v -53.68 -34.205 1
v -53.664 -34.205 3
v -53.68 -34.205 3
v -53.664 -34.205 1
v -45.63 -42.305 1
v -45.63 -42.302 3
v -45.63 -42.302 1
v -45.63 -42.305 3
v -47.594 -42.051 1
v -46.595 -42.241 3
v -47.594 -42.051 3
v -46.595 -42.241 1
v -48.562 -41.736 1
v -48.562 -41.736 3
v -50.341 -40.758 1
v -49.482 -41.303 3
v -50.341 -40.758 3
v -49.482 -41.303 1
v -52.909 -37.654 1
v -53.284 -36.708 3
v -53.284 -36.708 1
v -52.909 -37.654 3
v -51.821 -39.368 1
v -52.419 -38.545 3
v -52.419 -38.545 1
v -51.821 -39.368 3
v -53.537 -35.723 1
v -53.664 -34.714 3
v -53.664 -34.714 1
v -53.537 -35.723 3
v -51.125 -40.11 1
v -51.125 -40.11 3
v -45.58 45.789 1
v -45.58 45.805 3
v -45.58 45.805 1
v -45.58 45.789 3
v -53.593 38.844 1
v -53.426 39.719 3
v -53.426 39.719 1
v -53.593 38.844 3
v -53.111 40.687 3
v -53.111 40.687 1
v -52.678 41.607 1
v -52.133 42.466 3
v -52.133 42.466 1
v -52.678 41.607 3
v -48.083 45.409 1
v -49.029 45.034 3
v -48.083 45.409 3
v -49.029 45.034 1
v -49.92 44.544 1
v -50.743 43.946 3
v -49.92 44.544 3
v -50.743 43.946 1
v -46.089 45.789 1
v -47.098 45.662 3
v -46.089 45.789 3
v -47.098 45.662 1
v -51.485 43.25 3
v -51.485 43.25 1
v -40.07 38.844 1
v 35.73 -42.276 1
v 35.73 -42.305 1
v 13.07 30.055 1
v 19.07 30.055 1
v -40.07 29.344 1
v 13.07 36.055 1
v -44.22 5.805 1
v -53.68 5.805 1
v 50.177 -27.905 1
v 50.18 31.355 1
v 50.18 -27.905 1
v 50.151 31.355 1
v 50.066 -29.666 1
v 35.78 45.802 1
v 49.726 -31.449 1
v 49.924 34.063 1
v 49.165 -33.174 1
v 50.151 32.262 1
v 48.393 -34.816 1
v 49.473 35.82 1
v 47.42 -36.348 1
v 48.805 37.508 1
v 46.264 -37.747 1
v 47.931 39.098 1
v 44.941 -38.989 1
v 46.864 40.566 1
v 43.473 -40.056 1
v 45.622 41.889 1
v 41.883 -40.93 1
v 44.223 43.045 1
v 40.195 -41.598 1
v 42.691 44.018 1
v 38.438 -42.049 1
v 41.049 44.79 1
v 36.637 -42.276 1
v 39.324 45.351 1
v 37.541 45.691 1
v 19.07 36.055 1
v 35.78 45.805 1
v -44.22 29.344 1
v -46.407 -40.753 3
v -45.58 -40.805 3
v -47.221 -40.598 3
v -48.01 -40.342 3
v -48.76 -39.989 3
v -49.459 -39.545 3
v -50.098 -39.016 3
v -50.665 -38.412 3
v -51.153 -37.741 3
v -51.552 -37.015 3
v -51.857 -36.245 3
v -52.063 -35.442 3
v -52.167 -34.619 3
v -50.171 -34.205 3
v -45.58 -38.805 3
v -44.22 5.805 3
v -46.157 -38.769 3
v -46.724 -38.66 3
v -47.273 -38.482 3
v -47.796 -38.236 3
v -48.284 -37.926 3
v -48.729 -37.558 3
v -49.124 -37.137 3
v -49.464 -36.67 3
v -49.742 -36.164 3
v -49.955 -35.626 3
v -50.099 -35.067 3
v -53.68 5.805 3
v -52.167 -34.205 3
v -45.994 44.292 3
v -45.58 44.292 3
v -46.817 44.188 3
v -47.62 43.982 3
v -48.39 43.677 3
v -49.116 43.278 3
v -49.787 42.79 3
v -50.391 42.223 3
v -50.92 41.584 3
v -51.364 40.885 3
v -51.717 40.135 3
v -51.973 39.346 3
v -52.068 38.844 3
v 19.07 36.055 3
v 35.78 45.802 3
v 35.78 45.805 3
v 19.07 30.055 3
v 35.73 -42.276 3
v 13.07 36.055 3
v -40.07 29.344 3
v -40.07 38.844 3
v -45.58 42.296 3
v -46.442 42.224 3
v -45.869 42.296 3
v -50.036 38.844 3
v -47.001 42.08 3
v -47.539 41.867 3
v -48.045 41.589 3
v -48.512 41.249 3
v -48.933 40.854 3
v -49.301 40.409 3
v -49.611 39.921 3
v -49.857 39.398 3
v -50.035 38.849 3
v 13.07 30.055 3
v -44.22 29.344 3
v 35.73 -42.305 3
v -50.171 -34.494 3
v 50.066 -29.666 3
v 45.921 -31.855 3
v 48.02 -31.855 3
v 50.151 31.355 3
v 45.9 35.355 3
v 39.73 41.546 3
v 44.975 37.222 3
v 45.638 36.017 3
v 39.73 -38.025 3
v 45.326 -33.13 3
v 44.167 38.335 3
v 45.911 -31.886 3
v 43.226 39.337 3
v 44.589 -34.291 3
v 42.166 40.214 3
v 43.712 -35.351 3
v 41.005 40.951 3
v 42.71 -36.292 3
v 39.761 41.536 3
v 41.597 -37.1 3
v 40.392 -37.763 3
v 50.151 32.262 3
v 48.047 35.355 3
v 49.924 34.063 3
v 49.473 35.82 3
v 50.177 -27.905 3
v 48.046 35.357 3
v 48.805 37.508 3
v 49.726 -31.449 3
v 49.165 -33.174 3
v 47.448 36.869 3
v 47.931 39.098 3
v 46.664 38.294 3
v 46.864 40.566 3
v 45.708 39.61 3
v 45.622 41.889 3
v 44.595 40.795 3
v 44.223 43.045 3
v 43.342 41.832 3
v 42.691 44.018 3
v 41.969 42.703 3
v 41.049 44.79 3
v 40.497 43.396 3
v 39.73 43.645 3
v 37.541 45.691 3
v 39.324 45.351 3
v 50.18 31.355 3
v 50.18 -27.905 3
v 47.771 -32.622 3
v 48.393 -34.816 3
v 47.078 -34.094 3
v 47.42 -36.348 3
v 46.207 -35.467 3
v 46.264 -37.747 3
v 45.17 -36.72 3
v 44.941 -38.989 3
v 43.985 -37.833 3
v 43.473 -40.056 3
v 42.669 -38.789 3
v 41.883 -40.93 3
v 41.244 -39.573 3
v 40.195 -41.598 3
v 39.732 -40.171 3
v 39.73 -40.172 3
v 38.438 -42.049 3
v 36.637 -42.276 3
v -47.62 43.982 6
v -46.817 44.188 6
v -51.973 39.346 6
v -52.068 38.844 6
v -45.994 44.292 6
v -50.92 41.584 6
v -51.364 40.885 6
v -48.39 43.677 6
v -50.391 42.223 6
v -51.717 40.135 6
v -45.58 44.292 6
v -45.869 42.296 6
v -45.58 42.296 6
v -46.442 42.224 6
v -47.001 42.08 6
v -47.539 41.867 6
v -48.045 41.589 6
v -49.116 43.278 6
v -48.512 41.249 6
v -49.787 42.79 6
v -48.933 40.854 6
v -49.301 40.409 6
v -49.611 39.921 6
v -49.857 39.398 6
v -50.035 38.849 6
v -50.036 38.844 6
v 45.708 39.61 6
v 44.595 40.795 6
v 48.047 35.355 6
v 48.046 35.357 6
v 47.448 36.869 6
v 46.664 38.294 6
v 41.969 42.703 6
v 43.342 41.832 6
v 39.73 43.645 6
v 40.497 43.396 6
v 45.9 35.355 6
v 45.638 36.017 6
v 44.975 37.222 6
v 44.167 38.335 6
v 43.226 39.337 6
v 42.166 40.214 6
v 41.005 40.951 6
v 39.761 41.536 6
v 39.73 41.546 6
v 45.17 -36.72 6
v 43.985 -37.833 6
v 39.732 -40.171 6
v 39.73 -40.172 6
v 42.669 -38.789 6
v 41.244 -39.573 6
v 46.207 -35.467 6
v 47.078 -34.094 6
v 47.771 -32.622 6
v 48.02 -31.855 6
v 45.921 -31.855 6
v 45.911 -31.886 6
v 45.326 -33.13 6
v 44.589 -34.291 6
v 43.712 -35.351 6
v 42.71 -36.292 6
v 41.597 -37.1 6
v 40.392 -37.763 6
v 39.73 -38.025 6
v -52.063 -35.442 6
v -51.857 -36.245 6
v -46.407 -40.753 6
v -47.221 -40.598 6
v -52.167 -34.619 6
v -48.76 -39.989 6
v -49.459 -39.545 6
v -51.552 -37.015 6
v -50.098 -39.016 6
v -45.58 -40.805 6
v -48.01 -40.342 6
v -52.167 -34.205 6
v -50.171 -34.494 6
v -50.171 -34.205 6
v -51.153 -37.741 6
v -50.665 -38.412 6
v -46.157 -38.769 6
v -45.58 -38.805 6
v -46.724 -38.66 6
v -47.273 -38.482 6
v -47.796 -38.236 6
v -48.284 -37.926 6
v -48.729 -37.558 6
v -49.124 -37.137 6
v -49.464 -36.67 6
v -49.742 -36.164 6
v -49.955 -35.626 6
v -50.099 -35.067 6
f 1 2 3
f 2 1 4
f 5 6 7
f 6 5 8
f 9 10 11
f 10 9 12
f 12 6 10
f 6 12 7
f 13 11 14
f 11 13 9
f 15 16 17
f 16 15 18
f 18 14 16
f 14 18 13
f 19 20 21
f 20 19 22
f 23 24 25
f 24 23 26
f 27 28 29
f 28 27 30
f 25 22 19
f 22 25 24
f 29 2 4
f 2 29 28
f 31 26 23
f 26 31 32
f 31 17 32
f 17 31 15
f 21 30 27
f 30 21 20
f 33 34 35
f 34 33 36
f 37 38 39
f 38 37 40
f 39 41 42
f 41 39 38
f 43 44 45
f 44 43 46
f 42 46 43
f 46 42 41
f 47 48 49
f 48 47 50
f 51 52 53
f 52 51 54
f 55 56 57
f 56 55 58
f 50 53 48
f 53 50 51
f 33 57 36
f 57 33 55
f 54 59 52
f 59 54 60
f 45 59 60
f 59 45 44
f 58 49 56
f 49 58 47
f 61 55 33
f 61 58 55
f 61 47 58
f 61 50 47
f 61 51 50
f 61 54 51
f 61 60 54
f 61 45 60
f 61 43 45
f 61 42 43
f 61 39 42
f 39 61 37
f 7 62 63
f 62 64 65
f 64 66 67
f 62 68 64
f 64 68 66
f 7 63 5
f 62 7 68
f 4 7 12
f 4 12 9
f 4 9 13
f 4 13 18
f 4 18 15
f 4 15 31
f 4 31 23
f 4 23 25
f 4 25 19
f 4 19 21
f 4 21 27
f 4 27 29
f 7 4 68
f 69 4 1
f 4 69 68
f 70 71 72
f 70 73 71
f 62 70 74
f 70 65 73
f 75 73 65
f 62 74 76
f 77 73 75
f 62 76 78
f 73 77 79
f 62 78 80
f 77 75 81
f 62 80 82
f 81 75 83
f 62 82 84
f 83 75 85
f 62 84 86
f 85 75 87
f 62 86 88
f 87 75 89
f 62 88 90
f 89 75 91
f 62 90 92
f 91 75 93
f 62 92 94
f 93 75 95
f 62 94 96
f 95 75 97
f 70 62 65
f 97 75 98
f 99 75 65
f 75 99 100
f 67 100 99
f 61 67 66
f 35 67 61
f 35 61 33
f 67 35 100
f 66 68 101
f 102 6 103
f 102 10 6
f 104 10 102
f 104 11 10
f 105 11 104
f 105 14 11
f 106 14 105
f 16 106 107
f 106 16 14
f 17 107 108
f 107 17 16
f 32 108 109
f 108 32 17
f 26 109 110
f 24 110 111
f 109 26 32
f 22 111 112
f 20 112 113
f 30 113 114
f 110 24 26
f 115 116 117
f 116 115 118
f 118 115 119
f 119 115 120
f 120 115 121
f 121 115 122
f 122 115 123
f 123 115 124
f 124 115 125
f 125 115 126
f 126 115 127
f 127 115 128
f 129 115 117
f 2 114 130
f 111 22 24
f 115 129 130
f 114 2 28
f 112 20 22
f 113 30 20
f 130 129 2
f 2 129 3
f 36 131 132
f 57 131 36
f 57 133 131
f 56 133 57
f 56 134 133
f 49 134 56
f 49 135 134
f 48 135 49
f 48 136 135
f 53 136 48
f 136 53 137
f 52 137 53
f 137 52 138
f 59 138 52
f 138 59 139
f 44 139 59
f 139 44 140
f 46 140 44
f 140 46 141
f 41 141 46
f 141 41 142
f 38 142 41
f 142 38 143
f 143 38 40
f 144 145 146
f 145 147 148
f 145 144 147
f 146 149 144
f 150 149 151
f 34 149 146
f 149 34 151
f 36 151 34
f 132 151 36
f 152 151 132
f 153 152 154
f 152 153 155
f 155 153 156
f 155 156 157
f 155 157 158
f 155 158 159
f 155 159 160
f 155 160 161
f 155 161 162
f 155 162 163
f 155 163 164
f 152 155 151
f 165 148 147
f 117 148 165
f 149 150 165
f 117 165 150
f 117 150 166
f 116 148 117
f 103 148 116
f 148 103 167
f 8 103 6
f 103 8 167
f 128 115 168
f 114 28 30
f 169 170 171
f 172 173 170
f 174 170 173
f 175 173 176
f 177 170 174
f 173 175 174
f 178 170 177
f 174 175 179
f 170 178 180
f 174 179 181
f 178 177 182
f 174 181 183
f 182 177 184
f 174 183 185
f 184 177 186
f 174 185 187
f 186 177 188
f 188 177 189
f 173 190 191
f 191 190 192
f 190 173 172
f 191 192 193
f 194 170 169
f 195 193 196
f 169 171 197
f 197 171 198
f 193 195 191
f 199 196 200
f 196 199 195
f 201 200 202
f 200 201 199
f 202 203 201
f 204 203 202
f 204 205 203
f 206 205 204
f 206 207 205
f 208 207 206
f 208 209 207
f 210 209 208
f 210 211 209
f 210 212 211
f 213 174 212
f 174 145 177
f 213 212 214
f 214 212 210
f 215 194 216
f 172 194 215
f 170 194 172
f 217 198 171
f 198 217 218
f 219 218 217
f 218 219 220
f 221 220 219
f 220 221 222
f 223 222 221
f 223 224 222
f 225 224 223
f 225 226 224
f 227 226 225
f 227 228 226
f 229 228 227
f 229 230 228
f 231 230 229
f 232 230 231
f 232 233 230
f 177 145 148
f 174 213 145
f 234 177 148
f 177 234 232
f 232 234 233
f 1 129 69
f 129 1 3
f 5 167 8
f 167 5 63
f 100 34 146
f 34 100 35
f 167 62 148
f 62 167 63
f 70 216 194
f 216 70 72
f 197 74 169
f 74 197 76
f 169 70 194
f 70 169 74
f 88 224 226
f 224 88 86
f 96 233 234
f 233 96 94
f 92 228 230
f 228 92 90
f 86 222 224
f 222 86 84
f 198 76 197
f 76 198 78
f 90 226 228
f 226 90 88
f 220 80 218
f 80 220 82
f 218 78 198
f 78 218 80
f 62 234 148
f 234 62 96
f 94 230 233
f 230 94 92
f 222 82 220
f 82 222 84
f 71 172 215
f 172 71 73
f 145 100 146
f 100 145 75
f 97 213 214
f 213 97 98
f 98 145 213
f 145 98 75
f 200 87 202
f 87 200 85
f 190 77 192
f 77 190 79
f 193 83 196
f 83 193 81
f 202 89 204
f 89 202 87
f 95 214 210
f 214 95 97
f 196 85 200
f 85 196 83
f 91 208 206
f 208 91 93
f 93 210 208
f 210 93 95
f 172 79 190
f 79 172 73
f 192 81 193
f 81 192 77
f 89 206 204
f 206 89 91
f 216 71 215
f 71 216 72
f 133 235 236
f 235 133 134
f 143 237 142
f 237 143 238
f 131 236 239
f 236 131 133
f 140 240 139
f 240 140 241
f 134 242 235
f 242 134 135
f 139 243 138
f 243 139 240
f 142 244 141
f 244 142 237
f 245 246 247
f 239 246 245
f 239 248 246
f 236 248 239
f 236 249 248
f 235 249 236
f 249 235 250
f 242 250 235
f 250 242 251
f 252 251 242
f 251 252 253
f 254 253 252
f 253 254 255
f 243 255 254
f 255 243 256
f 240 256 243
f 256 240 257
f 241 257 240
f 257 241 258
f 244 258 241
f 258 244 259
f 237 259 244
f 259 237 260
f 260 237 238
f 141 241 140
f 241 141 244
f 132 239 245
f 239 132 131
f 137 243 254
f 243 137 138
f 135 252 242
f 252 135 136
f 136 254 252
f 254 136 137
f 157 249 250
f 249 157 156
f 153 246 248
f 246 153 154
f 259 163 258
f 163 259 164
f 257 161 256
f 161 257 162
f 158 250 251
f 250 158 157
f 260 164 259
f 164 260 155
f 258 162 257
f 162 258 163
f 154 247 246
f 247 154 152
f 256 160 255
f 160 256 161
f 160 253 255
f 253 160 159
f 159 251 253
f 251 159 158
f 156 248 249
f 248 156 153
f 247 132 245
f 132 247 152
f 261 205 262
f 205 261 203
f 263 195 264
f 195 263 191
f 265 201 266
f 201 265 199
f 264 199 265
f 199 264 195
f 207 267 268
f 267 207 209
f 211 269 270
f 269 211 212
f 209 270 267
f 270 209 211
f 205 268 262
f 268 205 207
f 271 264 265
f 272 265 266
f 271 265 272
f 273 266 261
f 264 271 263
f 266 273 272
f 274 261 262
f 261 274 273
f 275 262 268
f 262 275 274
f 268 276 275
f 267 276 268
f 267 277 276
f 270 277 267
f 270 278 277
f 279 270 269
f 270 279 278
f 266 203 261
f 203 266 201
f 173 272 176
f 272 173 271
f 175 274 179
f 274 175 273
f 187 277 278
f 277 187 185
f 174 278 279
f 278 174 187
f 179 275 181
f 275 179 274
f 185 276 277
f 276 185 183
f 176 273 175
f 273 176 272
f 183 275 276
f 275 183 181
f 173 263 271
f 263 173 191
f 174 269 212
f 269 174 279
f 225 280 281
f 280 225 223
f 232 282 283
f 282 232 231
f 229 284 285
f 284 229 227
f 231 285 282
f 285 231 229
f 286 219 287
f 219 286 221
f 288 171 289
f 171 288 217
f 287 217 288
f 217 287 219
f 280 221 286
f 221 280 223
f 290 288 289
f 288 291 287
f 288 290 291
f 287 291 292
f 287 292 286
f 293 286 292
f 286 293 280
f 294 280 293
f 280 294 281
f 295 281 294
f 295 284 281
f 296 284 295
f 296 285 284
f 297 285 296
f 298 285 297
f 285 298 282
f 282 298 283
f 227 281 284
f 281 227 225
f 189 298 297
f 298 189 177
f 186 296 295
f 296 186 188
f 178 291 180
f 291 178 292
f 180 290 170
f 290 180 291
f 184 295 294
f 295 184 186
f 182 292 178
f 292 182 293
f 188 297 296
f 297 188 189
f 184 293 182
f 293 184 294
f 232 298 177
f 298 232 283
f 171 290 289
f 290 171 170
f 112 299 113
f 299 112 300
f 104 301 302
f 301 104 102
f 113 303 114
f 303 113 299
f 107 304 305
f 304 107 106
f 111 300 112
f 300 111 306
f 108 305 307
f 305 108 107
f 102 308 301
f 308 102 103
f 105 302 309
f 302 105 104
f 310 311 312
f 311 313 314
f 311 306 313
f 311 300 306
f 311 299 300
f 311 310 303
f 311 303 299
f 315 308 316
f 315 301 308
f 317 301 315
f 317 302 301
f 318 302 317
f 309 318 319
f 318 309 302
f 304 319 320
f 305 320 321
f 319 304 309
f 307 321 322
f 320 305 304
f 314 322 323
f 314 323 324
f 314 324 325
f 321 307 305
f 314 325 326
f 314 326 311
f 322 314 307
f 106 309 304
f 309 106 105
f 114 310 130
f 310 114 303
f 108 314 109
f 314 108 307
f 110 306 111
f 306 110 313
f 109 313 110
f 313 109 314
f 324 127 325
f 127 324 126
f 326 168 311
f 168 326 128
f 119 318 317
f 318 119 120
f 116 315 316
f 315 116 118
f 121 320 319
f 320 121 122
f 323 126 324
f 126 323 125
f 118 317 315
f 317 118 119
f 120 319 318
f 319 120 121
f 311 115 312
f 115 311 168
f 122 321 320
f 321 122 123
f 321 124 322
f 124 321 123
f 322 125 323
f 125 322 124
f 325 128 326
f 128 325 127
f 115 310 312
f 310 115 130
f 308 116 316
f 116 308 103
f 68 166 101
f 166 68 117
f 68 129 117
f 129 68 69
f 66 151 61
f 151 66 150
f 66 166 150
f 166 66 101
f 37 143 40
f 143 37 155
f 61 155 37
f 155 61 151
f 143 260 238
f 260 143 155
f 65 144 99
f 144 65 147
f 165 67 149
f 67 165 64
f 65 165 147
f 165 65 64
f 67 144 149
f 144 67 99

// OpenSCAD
// file: BBB_SlimCase_v2_Library.scad
// ******************************************
// Beaglebone Black Slim Case Library
// Functions and Constants
// By Isaac Hayes
// Copyright 2014
// http://scuttlebots.com
//
// This program is free software; you can redistribute it and/or modify
// it under the terms of the GNU General Public License as published by
// the Free Software Foundation; either version 2 of the License, or
// (at your option) any later version.
//
// This program is distributed in the hope that it will be useful,
// but WITHOUT ANY WARRANTY; without even the implied warranty of
// MERCHANTABILITY or FITNESS FOR A PARTICULAR PURPOSE.  See the
// GNU General Public License for more details.
//
// You should have received a copy of the GNU General Public License along
// with this program; if not, write to the Free Software Foundation, Inc.,
// 51 Franklin Street, Fifth Floor, Boston, MA 02110-1301 USA.
// ******************************************

// ************************************
// Dimensions and Locations Math(s)
// ************************************

// -All dimensions in millimeters
// -Origin at bottom left corner of PCB
// -Ethernet and power jack face left closest to origin
// -X and Y refer to position of lower left corner of compoenent from origin
// -Z refers to distance from top of component to the PCB
// -L and W are Lenght(X) and Width(Y) to specify component size

//Board Dimensions
BB_L = 100.36;
BB_W = 84.61;
BB_Z = 1.65;
BB_SmCurve_R = 6.35;
BB_LgCurve_R = 12.70;

//Mounting Hole Locations (Clockwise from Bottom)
BB_Hole1X = 14.61;
BB_Hole1Y = 3.18;

BB_Hole2X = 14.61;
BB_Hole2Y = BB_Hole1Y + 48.39;

BB_Hole3X = BB_Hole1X + 66.10;
BB_Hole3Y = 6.35 + 41.91;

BB_Hole4X = BB_Hole1X + 66.10;
BB_Hole4Y = 6.35;

BB_Hole_ID = 2.75;
BB_Hole_OD = 4.45;

//Pin Headers
BB_P9_X = 18.415;
BB_P9_Y = 0.635;
BB_P9_Z = 8.60;
BB_P9_L = 58.42;
BB_P9_W = 5.08;

BB_P8_X = 18.415;
BB_P8_Y = 48.895;
BB_P8_Z = 8.60;
BB_P8_L = 58.42;
BB_P8_W = 5.08;

//Capacitor
BB_Cap_X = 65.00;
BB_Cap_Y = 8.00;
BB_Cap_Z = 11.00;
BB_Cap_L = 6.00;
BB_Cap_W = 6.00;

//Power jack
BB_PJack_X = -2.54;
BB_PJack_Y = 5.461;
BB_PJack_Z = 10.75;
BB_PJack_L = 14.15;
BB_PJack_W = 9.00;

//4 USB
BB_Eth_X = -2.54;
BB_Eth_Y = 7;
BB_Eth_Z = 13.33;
BB_Eth_L = 10;
BB_Eth_W = 31;

//DHT
BB_DHT_X = BB_L - 75;
BB_DHT_Y = 84.59 + 0.1;
BB_DHT_Z = -0.5;
BB_DHT_L = 8.50;
BB_DHT_W = 6.55;
BB_DHT_ZH = 1;

//USB MINI POWER
BB_USBD_X = -0.635;
BB_USBD_Y = 37.005 + 0.60;
BB_USBD_Z = 4.00;
BB_USBD_L = 6.91;
BB_USBD_W = 7.747;

//PH
BB_PH_X = BB_L + 0.635 - 27.50;
BB_PH_Y = 84.59 + 0.1;
BB_PH_Z = -2;
BB_PH_L = 7.50;
BB_PH_W = 6.55;

//MicroSD Card Port (Slot only)
BB_SD_X = BB_L - 14.90;
BB_SD_Y = 30.607 + 0.5;
BB_SD_Z = 1.75 - 0.5;
BB_SD_L = 14.90;
BB_SD_W = 11.05;

//CASE DIMENSIONS
//Outer Shell
Case_Thickness = 1.50;     //Wall Thickness
Case_Gap = 0.25;  //Gap between case walls and board
Case_L = BB_L + Case_Thickness*2 + Case_Gap*2;
Case_W = BB_W + Case_Thickness*2 + Case_Gap*2;
Case_SmCurve_R = BB_SmCurve_R + Case_Thickness + Case_Gap;
Case_LgCurve_R = BB_LgCurve_R + Case_Thickness + Case_Gap;
Case_PCB_Z = BB_USBD_Z + 1.00;      //Height PCB is suspended above case floor
Case_Z = Case_Thickness + Case_PCB_Z + BB_Z + BB_P9_Z;      //Total height of case
Cmp_Gap = 0.25;      //Gap around components
Cmp_Gap2 = Cmp_Gap*2;   //Gap around components times two

//Shell hollow inside dimensions
CutOut_L = BB_L + Case_Gap*2;
CutOut_W = BB_W + Case_Gap*2;
CutOut_SmCurve_R = BB_SmCurve_R + Case_Gap;
CutOut_LgCurve_R = BB_LgCurve_R + Case_Gap;
CutOut_Z = Case_Z - Case_Thickness;

//Lid Dimensions
Lid_Thickness = 2.00;
Lid_Grip_Thickness = 2.00;
Lid_Grip_Z = 3.00;
Lid_Grip_SmR = Case_SmCurve_R - Case_Thickness;
Lid_Grip_LgR = Case_LgCurve_R - Case_Thickness;

//Dev Station Rail Dimensions
DSR_L = Case_L - Case_LgCurve_R - Case_SmCurve_R;
DSR_W = 2.0;
DSR_H = 3.0;
DSRH_W = 4.0;

// ************************************
// cornerRoundedCube Module - See source below
// ************************************

// http://codeviewer.org/view/code:1b36 
// Copyright (C) 2011 Sergio Vilches
// This program is free software: you can redistribute it and/or modify it under the terms of the GNU General Public License as published by the Free Software Foundation, either version 3 of the License, or (at your option) any later version.
// This program is distributed in the hope that it will be useful, but WITHOUT ANY WARRANTY; without even the implied warranty of MERCHANTABILITY or FITNESS FOR A PARTICULAR PURPOSE. See the GNU General Public License for more details. You should have received a copy of the GNU General Public License along with this program. If not, see <http://www.gnu.org/licenses/>.
// Contact: s.vilches.e@gmail.com


//     ----------------------------------------------------------- 
//                  Round Corners Cube (Extruded)                
//       roundCornersCube(x,y,z,r) Where:                        
//          - x = Xdir width                                     
//          - y = Ydir width                                     
//          - z = Height of the cube                             
//          - r = Rounding radious                               
                                                              
//       Example: roundCornerCube(10,10,2,1);                    
//      *Some times it's needed to use F6 to see good results!   
//  	 ----------------------------------------------------------- 

// Code was modified to not use centered cubes - Isaac


module createMeniscus(h,radius) // This module creates the shape that needs to be substracted from a cube to make its corners rounded.
difference(){        //This shape is basicly the difference between a quarter of cylinder and a cube
   translate([radius/2+0.1,radius/2+0.1,0]){
      cube([radius+0.2,radius+0.1,h+0.2],center=true);         // All that 0.x numbers are to avoid "ghost boundaries" when substracting
   }

   cylinder(h=h+0.2,r=radius,$fn = 50,center=true);
}


module roundCornersCube(x,y,z,r)  // Now we just substract the shape we have created in the four corners
difference(){
   cube([x,y,z], center=false);

   translate([x-r,y-r,z/2]){  // We move to the first corner (x,y)
      rotate(0){  
         createMeniscus(z,r); // And substract the meniscus
      }
   }
   translate([r,y-r,z/2]){ // To the second corner (-x,y)
      rotate(90){
         createMeniscus(z,r); // But this time we have to rotate the meniscus 90 deg
      }
   }
   translate([r,r,z/2]){ // ... 
      rotate(180){
         createMeniscus(z,r);
      }
   }
   translate([x-r,r,z/2]){
      rotate(270){
         createMeniscus(z,r);
      }
   }
}
// main file
// ******************************************
// Beaglebone Black Slim Case
// By Isaac Hayes
// Copyright 2014
// http://scuttlebots.com
//
// This program is free software; you can redistribute it and/or modify
// it under the terms of the GNU General Public License as published by
// the Free Software Foundation; either version 2 of the License, or
// (at your option) any later version.
//
// This program is distributed in the hope that it will be useful,
// but WITHOUT ANY WARRANTY; without even the implied warranty of
// MERCHANTABILITY or FITNESS FOR A PARTICULAR PURPOSE.  See the
// GNU General Public License for more details.
//
// You should have received a copy of the GNU General Public License along
// with this program; if not, write to the Free Software Foundation, Inc.,
// 51 Franklin Street, Fifth Floor, Boston, MA 02110-1301 USA.
// ******************************************

// ************************************
// Render Options
// ************************************

// RENDER OPTIONS
// Set this variable to output the piece you want
// 0 - No Render
// 1 - Visual Only render
// 2 - Base for STL Export
// 3 - Lid for STL Export

   Render_Options = 3;

// LID OPTIONS
// Set this to select various lid Options
// 0 = Solid
// 1 = Pin Header Cut Outs

   Lid_Options = 0;

// DEV STATION OPTIONS
// Set this to add bottom rails for attachment to the BBB Dev Station Sled accessory
// 0 = Case Only
// 1 = Include rails

	DevRails_Options = 0;

// ************************************
// Include External Libraries
// ************************************

// 
include <BBB_SlimCase_v2_Library.scad>

// ************************************
// Dimensions and Locations Math(s)
// ************************************

// -All dimensions in millimeters
// -Origin at bottom left corner of PCB
// -Ethernet and power jack face left closest to origin
// -X and Y refer to position of lower left corner of compoenent from origin
// -Z refers to distance from top of component to the PCB
// -L and W are Lenght(X) and Width(Y) to specify component size


// ************************************
// Components
// ************************************

module Base()
{
	union() {
	difference() {
		//Outer Shell of Case (Join two cubes together with different corner radii to achieve different size corners on each end)
		translate([-Case_Thickness-Case_Gap, -Case_Thickness-Case_Gap, -Case_Thickness]) {
		union() {
			roundCornersCube(Case_L-Case_LgCurve_R, Case_W, Case_Z, Case_SmCurve_R);
			translate ([Case_SmCurve_R,0,0]) roundCornersCube(Case_L-Case_SmCurve_R, Case_W, Case_Z, Case_LgCurve_R);
		}}
		
		//Hollow Out Inside of Case
		translate([-Case_Gap,-Case_Gap,0]) {
		union() {
			roundCornersCube(CutOut_L-CutOut_LgCurve_R, CutOut_W, CutOut_Z, CutOut_SmCurve_R);
			translate ([CutOut_SmCurve_R,0,0]) roundCornersCube(CutOut_L-CutOut_SmCurve_R, CutOut_W, CutOut_Z, CutOut_LgCurve_R);
		}}
		
		//Components Cutouts

		//Ethernet Jack
		translate([BB_Eth_X-Cmp_Gap-Case_Thickness+0.5, BB_Eth_Y-Cmp_Gap, Case_PCB_Z+BB_Z]) cube([BB_Eth_L+Cmp_Gap2+Case_Thickness+0.5, BB_Eth_W+Cmp_Gap2, BB_Eth_Z+Cmp_Gap]);
		//Power Jack
		/*translate([BB_PJack_X-Cmp_Gap-Case_Thickness+0.5, BB_PJack_Y-Cmp_Gap, Case_PCB_Z+BB_Z]) cube([BB_PJack_L+Cmp_Gap2+Case_Thickness+0.5, BB_PJack_W+Cmp_Gap2, BB_PJack_Z+Cmp_Gap]);*/
		//MICRO USB Port
		translate([BB_USBD_X-Cmp_Gap-Case_Thickness+0.5, BB_USBD_Y-Cmp_Gap, 0.75]) 
            cube([BB_USBD_L+Cmp_Gap2+Case_Thickness+0.5, BB_USBD_W+Cmp_Gap2, BB_USBD_Z+Cmp_Gap]);
        
        //~~// GROVE SIDE //~~//
        //DHT -- OLD(Y AXIS SQUARE)
        //translate([BB_USBH_X-Cmp_Gap+0.5, BB_USBH_Y-Cmp_Gap, BB_USBH_ZZ]) cube([BB_USBH_L+Cmp_Gap2+Case_Thickness+0.5, BB_USBH_W+Cmp_Gap2, BB_USBH_Z+Cmp_Gap]);
		/*translate([BB_USBH_X-Cmp_Gap, BB_USBH_Y-Cmp_Gap, Case_PCB_Z+BB_Z]) cube([BB_USBH_L+Cmp_Gap2+Case_Thickness+0.5, BB_USBH_W+Cmp_Gap2, CutOut_Z+Cmp_Gap]);
		/*translate([BB_USBH_X-Cmp_Gap, BB_USBH_Y-Cmp_Gap, Case_PCB_Z+BB_Z]) cube([BB_USBH_L+Cmp_Gap2+Case_Thickness+0.5, BB_USBH_W+Cmp_Gap2, CutOut_Z]);//BB_USBH_Z+Cmp_Gap]);*/
		//SD Card
        
		//translate([BB_SD_X-Cmp_Gap, BB_SD_Y-Cmp_Gap, Case_PCB_Z-BB_SD_Z]) cube([BB_SD_L+Cmp_Gap2+Case_Thickness+0.5, BB_SD_W+Cmp_Gap2, BB_SD_Z+Cmp_Gap2]);
		//PH
        
                translate([BB_PH_X-Cmp_Gap, BB_PH_Y-Cmp_Gap, Case_PCB_Z-BB_PH_Z]){
            rotate([90,90,90])
            cylinder(h=10, r=5.75, center=true);
        }
        
        

        
        //DHT SLOTS
        
        translate([BB_DHT_X-Cmp_Gap, BB_DHT_Y-Cmp_Gap, Case_PCB_Z-BB_DHT_Z-3]){
           cube([BB_DHT_L+Cmp_Gap2+Case_Thickness+0.5, BB_DHT_W+Cmp_Gap2, BB_DHT_ZH+Cmp_Gap2]);
        }
        translate([BB_DHT_X-Cmp_Gap, BB_DHT_Y-Cmp_Gap, Case_PCB_Z-BB_DHT_Z]){
           cube([BB_DHT_L+Cmp_Gap2+Case_Thickness+0.5, BB_DHT_W+Cmp_Gap2, BB_DHT_ZH+Cmp_Gap2]);
        }
        translate([BB_DHT_X-Cmp_Gap, BB_DHT_Y-Cmp_Gap, Case_PCB_Z-BB_DHT_Z+3]){
           cube([BB_DHT_L+Cmp_Gap2+Case_Thickness+0.5, BB_DHT_W+Cmp_Gap2, BB_DHT_ZH+Cmp_Gap2]);
        }
	}
    
		//Mounting pegs
		translate([BB_Hole1X,BB_Hole1Y,0]) MountingPeg();
		translate([BB_Hole2X,BB_Hole2Y,0]) MountingPeg();
		translate([BB_Hole3X,BB_Hole3Y,0]) MountingPegFlat();
		translate([BB_Hole4X,BB_Hole4Y,0]) MountingPeg();

		//Dev Station rails
		if (DevRails_Options == 1) {
			translate([Case_SmCurve_R-Case_Thickness-Case_Gap,Case_W-Case_Thickness-Case_Gap,-Case_Thickness]) DevRail(DSR_L, DSR_W, DSR_H);
			translate([DSR_L+Case_SmCurve_R-Case_Thickness-Case_Gap,-Case_Thickness-Case_Gap,-Case_Thickness]) rotate([0,0,180]) {
				DevRail(DSR_L, DSR_W, DSR_H);
			}
		}

	}
}

module Lid()
{
	difference() {	
		translate([-Case_Thickness-Case_Gap, -Case_Thickness-Case_Gap, -Case_Thickness]) {
		union() {
			//
			translate([0,0,Case_Z]) roundCornersCube(Case_L-Case_LgCurve_R, Case_W, Lid_Thickness, Case_SmCurve_R);
			translate ([Case_SmCurve_R,0,Case_Z]) roundCornersCube(Case_L-Case_SmCurve_R, Case_W, Lid_Thickness, Case_LgCurve_R);

			//Lid Grips
			translate([Case_Thickness,Case_Thickness,Case_Z-Lid_Grip_Z]) CornerGrip(Lid_Grip_SmR,Lid_Grip_Thickness,Lid_Grip_Z,0,0);
			translate([Case_L-Case_Thickness,Case_Thickness,Case_Z-Lid_Grip_Z]) CornerGrip(Lid_Grip_LgR,Lid_Grip_Thickness,Lid_Grip_Z,90,4);
			translate([Case_L-Case_Thickness,Case_W-Case_Thickness,Case_Z-Lid_Grip_Z]) CornerGrip(Lid_Grip_LgR,Lid_Grip_Thickness,Lid_Grip_Z,180,4);
			translate([Case_Thickness,Case_W-Case_Thickness,Case_Z-Lid_Grip_Z]) CornerGrip(Lid_Grip_SmR,Lid_Grip_Thickness,Lid_Grip_Z,270,0);
			translate([Case_Thickness,BB_PJack_Y+Case_Thickness+Case_Gap,Case_Z-Lid_Grip_Z]) cube([Lid_Grip_Thickness, BB_Eth_Y-BB_PJack_Y, Lid_Grip_Z]);
		}}

		//Component Cutouts
		
		//Ethernet Jack
		translate([BB_Eth_X-Cmp_Gap-1.25, BB_Eth_Y-Cmp_Gap, Case_PCB_Z+BB_Z]) cube([BB_Eth_L+Cmp_Gap2+1.25, BB_Eth_W+Cmp_Gap2, BB_Eth_Z+Cmp_Gap]);
		//Power Jack
		translate([BB_PJack_X-Cmp_Gap-1.25, BB_PJack_Y-Cmp_Gap, Case_PCB_Z+BB_Z]) cube([BB_PJack_L+Cmp_Gap2+1.25, BB_PJack_W+Cmp_Gap2, BB_PJack_Z+Cmp_Gap]);
		//Pin Headers
		if (Lid_Options == 1) {
			translate([BB_P8_X-Cmp_Gap, BB_P8_Y-Cmp_Gap, 0]) cube([BB_P8_L+Cmp_Gap2, BB_P8_W +Cmp_Gap2, 75]);
			translate([BB_P9_X-Cmp_Gap, BB_P9_Y-Cmp_Gap, 0]) cube([BB_P9_L+Cmp_Gap2, BB_P9_W +Cmp_Gap2, 75]);
		}
		//Capacitor
		translate([BB_Cap_X, BB_Cap_Y, Case_PCB_Z+BB_Z]) cube([BB_Cap_L, BB_Cap_W, BB_Cap_Z]);

		
	}
}

module MountingPeg()
{
	union() {
		cylinder(h=Case_PCB_Z, d=BB_Hole_OD, $fn=25);
		cylinder(h=Case_PCB_Z/2, d1=BB_Hole_OD*1.5, d2=BB_Hole_OD, $fn=25);
		translate([0,0,Case_PCB_Z-0.1]) cylinder(h=BB_Z/2+0.1,d=BB_Hole_ID, $fn=25);
		translate([0,0,Case_PCB_Z+BB_Z/2-0.1]) cylinder(h=BB_Z/2+0.1,d1=BB_Hole_ID, d2=BB_Hole_ID/2, $fn=25);
	}
}

module MountingPegFlat()
{
	union() {
		cylinder(h=Case_PCB_Z, d=BB_Hole_OD, $fn=25);
		cylinder(h=Case_PCB_Z/2, d1=BB_Hole_OD*1.5, d2=BB_Hole_OD, $fn=25);
		//translate([0,0,Case_PCB_Z-0.1]) cylinder(h=BB_Z/2+0.1,d=BB_Hole_ID, $fn=25);
		//translate([0,0,Case_PCB_Z+BB_Z/2-0.1]) cylinder(h=BB_Z/2+0.1,d1=BB_Hole_ID, d2=BB_Hole_ID/2, $fn=25);
	}
}

module CornerGrip(R,T,Z,D,CutOff)
{
	rotate([0,0,D]) {
		difference() {
			translate([R,R,0]) cylinder(r=R, h=Z, $fn=50);
			translate([R,R,0]) cylinder(r=R-T, h=Z, $fn=50);
			translate([R-CutOff,0,0]) cube([R*2+CutOff,R*2+CutOff,Z]);
			translate([0,R-CutOff,0]) cube([R*2+CutOff,R*2+CutOff,Z]);
		}
	}
}

module DevRail(X, Y, Z)
{
	SZ = Z * cos(45);
	union() {
		cube([X,Y,Z]);
		translate([0,Y,0]) rotate([45,0,0]) cube([X,SZ,SZ]);
	}
}

// ************************************
// Output Renders
// ************************************

color("Green"){
	render(convexity=4) {
		if (Render_Options == 1) {
			Base();
			translate([0,0,2]) Lid();
		}
		if (Render_Options == 2) {
			Base();
		}
		if (Render_Options == 3) {
			rotate([180,0,0]) translate([-Case_L/2,-Case_W/2,-Case_Z-Case_Thickness]) Lid();
		}
	}
}
